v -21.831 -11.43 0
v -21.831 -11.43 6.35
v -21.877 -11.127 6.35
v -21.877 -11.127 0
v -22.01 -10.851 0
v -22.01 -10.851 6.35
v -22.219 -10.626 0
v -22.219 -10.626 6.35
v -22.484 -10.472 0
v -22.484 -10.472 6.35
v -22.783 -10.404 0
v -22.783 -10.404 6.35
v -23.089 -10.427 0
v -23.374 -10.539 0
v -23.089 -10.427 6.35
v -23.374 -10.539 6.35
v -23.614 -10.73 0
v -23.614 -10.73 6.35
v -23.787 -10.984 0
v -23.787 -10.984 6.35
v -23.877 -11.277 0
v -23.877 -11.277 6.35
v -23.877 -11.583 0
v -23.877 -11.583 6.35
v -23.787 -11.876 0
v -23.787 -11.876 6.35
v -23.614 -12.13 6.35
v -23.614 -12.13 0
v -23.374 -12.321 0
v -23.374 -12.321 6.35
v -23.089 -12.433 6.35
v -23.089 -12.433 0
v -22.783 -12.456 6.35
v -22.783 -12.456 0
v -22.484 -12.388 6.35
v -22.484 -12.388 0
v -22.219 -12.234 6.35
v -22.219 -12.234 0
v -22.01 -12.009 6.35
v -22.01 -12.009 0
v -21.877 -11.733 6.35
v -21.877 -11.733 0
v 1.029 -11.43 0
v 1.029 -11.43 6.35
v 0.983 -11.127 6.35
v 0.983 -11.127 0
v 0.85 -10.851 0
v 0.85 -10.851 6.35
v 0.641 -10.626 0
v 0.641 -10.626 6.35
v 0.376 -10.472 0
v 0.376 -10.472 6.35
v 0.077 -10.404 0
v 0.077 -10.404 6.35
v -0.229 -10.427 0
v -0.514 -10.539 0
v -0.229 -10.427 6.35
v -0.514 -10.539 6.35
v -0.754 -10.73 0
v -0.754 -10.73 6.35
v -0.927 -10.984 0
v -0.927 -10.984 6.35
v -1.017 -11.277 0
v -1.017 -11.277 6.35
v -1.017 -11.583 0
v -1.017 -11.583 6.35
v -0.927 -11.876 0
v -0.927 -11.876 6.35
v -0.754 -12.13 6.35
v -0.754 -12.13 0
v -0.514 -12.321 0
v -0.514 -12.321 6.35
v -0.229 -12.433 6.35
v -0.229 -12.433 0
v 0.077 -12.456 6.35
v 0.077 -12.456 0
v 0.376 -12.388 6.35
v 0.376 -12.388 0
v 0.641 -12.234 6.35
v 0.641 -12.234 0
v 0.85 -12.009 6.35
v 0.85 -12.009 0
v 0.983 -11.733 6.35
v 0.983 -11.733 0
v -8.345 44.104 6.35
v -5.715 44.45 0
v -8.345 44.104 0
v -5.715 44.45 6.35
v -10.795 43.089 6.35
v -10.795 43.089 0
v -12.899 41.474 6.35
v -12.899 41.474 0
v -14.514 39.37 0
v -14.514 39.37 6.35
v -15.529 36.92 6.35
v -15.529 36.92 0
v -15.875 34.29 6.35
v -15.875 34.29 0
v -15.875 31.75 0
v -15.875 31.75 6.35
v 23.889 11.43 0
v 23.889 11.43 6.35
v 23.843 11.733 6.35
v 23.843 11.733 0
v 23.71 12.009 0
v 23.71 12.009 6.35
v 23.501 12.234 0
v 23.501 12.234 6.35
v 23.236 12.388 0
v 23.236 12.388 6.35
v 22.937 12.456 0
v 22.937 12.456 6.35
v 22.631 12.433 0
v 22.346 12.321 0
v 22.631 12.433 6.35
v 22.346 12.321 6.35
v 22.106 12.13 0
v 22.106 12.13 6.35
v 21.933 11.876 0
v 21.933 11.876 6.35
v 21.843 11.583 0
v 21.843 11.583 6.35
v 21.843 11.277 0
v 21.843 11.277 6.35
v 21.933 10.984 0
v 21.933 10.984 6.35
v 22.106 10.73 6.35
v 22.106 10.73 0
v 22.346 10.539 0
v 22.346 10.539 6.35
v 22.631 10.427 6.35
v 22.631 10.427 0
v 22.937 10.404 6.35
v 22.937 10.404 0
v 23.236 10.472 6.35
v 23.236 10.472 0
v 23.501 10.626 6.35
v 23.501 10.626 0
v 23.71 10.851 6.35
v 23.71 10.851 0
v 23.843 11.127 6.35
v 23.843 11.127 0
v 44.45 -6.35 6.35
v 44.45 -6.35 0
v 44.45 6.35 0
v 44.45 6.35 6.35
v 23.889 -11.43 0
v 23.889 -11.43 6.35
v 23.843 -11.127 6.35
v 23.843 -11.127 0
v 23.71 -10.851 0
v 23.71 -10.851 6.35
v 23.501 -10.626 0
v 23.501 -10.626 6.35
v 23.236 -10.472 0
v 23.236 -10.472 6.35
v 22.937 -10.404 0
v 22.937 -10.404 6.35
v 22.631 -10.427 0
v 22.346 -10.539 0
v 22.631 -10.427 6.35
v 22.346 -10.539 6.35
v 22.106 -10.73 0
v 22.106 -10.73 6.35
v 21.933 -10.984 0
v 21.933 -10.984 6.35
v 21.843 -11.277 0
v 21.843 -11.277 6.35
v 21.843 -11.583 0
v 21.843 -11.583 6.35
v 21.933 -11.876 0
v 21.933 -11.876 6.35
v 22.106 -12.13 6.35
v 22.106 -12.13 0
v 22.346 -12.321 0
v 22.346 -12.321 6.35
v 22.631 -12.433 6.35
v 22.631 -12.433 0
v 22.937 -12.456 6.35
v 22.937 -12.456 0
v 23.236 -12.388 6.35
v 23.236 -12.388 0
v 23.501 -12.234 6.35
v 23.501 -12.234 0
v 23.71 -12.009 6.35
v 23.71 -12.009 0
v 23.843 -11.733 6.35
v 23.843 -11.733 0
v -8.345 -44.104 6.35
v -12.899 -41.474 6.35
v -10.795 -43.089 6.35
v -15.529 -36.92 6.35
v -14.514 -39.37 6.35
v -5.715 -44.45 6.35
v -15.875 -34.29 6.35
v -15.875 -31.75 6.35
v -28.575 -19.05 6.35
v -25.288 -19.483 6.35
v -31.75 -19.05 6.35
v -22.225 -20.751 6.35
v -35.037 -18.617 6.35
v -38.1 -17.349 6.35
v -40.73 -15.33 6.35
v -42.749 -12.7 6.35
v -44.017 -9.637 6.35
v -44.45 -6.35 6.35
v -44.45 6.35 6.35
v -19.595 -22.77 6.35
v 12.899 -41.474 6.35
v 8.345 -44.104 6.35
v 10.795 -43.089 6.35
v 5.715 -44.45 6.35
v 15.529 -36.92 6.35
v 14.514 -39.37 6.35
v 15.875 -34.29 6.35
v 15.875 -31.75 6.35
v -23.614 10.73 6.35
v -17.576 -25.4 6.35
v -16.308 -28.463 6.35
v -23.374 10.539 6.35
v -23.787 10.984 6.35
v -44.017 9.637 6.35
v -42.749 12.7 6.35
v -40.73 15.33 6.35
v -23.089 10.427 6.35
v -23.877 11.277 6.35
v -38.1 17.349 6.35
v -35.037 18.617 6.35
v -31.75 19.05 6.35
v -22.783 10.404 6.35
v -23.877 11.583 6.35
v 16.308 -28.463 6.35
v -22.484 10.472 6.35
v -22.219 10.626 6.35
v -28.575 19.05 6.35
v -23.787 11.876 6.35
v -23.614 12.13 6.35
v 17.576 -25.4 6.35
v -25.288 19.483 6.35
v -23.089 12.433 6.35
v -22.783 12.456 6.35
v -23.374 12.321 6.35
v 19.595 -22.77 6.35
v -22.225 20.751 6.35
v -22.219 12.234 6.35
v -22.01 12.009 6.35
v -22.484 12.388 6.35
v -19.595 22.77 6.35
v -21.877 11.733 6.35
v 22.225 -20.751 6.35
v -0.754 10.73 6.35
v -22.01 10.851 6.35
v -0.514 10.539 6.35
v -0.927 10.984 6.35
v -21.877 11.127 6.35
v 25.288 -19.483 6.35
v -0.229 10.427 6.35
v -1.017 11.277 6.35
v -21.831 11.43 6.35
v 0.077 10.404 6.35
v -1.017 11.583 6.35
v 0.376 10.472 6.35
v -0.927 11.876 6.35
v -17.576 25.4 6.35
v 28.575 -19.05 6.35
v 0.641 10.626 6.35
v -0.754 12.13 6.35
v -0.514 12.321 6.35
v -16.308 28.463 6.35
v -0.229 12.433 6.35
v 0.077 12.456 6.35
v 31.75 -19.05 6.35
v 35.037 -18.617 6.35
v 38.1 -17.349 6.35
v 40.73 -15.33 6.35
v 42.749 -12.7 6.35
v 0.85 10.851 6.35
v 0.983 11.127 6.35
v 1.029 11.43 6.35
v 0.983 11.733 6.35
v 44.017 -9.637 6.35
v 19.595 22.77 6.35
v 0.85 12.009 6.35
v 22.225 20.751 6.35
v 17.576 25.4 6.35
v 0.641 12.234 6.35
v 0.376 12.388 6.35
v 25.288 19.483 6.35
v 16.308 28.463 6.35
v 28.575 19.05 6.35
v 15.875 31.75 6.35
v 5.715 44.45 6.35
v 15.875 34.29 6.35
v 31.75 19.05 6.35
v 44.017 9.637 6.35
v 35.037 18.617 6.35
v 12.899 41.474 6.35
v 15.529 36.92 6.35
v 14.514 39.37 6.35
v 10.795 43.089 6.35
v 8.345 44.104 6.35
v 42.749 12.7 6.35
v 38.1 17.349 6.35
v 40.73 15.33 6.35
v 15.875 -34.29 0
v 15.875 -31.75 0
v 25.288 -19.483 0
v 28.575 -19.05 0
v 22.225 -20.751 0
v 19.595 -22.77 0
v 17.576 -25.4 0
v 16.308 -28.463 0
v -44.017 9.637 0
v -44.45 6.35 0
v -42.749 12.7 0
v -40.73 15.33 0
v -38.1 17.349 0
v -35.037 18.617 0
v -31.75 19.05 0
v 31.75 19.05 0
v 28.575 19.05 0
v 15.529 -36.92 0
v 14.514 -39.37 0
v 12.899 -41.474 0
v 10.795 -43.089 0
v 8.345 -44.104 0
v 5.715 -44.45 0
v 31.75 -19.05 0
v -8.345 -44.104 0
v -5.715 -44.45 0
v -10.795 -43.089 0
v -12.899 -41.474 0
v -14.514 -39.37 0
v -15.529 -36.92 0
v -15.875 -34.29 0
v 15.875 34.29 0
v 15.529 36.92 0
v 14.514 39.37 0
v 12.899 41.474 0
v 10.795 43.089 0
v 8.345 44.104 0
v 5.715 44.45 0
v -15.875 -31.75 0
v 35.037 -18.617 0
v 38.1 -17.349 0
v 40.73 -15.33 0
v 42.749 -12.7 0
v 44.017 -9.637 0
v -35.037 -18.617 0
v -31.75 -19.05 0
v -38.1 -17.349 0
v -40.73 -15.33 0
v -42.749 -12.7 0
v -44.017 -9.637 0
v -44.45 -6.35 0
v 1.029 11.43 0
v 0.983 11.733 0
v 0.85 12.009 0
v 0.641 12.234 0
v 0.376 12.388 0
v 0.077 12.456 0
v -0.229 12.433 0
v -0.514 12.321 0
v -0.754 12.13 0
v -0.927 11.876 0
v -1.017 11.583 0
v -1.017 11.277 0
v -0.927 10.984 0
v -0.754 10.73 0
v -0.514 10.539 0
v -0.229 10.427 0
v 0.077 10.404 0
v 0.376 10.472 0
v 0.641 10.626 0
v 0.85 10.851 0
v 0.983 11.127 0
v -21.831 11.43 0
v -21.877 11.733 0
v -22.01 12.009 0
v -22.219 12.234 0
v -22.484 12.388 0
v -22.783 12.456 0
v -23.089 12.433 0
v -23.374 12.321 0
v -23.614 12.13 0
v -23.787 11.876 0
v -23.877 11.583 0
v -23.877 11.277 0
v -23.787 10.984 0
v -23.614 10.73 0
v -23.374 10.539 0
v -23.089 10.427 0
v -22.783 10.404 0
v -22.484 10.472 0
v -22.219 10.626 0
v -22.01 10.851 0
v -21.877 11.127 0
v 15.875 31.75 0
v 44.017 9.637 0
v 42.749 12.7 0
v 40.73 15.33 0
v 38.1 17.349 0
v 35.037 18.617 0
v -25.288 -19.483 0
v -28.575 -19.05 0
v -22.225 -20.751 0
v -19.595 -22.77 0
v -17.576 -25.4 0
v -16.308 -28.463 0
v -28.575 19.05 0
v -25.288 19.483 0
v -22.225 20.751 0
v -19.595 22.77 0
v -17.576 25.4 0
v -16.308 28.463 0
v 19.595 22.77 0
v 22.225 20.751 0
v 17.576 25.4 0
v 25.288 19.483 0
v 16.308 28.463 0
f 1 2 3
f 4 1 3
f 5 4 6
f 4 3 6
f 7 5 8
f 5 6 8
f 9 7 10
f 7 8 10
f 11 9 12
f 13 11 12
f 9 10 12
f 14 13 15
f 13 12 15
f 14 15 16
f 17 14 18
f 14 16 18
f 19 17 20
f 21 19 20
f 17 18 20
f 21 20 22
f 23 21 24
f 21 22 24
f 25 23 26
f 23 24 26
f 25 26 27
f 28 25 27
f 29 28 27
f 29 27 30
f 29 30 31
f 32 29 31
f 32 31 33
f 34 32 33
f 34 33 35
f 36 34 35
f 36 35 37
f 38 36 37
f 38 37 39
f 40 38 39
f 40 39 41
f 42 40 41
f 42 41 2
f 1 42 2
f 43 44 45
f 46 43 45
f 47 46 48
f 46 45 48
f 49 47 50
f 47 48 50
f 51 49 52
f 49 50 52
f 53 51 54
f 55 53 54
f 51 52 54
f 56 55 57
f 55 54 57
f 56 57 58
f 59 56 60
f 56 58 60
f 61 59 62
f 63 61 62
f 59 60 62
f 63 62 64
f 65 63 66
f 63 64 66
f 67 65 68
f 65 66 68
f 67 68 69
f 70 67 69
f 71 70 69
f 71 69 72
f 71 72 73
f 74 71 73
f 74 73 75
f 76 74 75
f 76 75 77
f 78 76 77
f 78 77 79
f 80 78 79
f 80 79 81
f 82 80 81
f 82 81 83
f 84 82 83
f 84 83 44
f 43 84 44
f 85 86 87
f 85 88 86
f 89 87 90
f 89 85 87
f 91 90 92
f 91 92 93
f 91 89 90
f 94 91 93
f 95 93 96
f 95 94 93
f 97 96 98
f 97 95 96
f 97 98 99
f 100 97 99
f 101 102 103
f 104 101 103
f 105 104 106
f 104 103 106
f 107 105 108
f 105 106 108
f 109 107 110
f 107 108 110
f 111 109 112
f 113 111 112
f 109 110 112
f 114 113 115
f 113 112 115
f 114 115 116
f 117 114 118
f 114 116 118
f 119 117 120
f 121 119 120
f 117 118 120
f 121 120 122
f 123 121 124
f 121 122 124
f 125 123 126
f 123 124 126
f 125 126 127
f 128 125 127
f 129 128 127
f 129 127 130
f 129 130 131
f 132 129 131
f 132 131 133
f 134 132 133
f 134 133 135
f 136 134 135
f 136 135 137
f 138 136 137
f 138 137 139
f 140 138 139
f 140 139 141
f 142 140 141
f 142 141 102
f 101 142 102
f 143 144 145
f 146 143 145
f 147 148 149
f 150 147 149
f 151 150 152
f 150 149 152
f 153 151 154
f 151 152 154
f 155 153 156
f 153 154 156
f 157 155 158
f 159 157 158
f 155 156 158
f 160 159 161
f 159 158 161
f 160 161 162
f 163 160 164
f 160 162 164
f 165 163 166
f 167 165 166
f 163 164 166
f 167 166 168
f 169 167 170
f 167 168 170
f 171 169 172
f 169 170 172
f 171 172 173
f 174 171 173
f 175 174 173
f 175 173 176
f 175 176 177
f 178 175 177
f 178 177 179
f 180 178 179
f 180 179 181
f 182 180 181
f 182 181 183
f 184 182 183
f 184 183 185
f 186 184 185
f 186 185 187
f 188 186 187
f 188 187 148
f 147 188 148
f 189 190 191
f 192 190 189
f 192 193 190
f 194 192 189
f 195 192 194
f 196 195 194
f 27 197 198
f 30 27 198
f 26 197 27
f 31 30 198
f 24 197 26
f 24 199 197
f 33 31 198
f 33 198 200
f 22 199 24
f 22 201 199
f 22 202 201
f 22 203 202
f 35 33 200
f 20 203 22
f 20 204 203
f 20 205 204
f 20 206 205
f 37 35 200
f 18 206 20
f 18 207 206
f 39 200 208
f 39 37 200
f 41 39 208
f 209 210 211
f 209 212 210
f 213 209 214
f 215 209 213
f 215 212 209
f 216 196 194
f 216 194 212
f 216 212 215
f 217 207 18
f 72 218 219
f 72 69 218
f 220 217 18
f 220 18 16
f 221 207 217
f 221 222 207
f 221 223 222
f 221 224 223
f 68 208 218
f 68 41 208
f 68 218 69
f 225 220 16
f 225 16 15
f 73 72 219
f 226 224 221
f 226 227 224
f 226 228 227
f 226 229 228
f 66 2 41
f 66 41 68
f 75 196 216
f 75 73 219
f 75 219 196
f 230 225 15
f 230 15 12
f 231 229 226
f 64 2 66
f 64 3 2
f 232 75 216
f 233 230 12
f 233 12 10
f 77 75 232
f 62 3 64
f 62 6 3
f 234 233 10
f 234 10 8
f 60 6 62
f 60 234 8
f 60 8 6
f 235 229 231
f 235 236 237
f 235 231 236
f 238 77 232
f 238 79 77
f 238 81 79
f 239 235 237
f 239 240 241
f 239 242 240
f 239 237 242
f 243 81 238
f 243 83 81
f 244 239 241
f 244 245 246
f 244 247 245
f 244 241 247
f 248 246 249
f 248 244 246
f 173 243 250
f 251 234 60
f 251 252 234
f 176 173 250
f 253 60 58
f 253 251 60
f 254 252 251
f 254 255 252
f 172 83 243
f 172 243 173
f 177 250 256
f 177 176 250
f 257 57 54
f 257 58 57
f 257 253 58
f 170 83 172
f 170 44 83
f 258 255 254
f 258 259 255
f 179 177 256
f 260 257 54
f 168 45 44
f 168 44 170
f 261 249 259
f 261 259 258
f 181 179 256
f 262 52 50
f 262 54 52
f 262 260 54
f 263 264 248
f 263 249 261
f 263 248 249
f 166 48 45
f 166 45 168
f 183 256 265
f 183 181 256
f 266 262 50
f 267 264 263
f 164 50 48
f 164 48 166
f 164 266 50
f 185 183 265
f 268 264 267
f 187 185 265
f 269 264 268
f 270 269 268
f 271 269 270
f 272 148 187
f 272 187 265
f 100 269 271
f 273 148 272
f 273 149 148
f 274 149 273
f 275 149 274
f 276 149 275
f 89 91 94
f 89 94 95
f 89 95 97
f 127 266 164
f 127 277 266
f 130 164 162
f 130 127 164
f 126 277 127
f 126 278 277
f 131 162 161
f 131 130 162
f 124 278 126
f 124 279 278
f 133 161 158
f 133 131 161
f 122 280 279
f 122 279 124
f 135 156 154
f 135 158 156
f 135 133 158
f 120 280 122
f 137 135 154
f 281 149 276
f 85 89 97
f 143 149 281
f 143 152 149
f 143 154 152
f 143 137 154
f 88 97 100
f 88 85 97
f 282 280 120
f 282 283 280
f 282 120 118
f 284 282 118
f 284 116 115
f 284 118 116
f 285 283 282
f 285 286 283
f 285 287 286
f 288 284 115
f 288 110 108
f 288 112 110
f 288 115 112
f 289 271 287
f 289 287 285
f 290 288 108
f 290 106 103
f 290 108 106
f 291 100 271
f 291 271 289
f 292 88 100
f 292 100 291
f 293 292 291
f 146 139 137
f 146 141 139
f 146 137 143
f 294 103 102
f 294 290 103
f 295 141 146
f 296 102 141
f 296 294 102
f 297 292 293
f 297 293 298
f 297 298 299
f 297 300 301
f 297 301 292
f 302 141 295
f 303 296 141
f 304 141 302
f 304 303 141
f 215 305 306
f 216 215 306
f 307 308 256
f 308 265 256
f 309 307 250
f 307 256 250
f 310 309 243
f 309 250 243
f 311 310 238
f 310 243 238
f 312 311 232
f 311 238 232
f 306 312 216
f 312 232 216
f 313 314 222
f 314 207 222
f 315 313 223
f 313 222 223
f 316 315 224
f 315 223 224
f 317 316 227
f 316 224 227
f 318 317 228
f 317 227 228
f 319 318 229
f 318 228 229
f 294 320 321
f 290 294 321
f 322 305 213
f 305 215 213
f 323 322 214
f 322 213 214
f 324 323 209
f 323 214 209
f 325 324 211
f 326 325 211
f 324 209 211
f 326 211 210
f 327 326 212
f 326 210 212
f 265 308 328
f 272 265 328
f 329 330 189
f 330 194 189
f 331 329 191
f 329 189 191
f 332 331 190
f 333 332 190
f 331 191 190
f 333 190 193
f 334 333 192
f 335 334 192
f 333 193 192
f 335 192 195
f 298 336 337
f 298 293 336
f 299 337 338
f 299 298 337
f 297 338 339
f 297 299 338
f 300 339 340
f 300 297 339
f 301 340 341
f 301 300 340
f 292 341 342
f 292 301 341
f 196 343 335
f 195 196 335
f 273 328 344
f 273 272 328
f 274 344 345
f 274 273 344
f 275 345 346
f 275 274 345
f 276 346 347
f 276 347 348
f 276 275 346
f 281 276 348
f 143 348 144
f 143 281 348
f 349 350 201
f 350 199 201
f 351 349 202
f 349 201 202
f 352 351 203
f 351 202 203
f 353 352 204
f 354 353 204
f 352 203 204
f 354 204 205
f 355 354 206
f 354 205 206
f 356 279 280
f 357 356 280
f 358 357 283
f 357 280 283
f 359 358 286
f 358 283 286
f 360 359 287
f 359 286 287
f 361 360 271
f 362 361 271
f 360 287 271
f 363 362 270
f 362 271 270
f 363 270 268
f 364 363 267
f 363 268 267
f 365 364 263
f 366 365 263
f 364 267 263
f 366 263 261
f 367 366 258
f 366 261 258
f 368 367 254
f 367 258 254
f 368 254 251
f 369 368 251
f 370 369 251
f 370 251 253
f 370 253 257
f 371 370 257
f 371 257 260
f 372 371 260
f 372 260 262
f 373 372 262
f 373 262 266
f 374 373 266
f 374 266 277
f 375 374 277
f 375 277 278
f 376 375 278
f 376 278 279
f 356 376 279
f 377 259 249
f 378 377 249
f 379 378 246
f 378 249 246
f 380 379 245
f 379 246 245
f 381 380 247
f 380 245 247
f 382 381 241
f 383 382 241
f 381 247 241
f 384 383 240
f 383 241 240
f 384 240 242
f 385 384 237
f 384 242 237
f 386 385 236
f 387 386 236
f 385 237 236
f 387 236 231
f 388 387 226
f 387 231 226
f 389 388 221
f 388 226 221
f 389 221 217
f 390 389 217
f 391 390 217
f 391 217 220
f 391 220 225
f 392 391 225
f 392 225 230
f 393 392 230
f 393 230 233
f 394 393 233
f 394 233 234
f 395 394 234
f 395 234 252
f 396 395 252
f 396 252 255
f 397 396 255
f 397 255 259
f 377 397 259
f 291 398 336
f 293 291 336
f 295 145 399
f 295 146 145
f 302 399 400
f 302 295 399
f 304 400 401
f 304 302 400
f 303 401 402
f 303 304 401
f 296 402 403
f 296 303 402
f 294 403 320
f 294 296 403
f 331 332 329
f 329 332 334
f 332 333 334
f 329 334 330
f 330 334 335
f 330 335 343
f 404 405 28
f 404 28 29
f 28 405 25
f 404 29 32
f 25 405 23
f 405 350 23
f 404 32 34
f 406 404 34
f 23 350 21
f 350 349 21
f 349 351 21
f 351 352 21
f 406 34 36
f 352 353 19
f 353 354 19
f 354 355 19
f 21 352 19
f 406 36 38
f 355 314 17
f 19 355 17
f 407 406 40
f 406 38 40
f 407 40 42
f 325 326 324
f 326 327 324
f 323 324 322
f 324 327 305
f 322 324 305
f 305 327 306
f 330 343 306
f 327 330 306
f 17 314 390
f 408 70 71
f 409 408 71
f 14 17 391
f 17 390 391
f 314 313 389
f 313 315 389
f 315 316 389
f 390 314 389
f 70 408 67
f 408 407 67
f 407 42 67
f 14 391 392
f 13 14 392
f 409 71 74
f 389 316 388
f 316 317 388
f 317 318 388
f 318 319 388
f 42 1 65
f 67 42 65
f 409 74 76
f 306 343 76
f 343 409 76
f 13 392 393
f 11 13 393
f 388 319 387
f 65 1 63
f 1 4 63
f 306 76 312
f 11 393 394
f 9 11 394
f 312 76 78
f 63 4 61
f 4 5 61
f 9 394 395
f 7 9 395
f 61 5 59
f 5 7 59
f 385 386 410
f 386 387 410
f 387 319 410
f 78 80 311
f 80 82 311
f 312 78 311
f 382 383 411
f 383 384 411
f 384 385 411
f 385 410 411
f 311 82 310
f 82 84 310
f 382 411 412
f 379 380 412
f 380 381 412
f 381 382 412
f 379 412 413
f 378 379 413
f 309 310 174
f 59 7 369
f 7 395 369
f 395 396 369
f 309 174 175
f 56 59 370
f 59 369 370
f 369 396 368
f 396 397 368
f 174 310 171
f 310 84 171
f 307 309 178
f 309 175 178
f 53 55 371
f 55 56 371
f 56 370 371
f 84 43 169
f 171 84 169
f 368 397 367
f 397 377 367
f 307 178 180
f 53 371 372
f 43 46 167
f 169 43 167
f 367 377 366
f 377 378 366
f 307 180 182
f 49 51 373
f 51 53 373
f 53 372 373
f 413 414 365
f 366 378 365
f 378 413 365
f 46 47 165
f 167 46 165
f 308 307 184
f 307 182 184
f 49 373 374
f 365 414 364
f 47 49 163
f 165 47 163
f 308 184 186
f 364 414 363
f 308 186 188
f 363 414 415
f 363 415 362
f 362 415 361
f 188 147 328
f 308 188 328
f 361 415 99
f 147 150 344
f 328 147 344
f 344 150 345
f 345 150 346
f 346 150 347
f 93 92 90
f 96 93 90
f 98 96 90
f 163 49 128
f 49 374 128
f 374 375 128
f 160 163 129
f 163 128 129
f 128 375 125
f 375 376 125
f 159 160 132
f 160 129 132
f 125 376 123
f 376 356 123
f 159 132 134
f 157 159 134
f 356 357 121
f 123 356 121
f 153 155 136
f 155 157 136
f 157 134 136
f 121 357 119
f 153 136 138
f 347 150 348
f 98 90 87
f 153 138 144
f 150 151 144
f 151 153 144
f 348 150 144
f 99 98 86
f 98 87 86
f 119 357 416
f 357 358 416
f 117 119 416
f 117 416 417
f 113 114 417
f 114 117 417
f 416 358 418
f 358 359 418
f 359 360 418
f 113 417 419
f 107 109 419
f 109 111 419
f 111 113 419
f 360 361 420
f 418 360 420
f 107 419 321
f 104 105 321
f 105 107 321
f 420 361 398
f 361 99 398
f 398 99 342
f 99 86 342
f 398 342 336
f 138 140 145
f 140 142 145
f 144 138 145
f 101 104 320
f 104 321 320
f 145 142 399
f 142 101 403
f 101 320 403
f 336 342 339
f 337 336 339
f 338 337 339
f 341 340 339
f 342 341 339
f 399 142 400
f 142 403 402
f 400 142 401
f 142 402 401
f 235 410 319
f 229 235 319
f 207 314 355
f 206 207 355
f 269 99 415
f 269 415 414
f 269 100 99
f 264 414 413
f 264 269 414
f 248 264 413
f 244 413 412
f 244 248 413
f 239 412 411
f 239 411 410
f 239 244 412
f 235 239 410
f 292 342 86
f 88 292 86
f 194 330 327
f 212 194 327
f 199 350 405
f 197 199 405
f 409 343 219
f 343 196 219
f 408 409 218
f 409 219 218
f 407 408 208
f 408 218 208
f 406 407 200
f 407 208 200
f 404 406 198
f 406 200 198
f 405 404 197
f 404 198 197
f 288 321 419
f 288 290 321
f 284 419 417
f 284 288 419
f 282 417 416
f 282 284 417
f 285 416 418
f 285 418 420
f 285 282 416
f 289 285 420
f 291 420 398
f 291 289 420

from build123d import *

# Parameters (mm, degrees)
F1_DEPTH = 6.35
F2_R     = 1.0287
F3_DEPTH = 25.4
F4_R     = 12.7
F5_R     = 10.16


with BuildPart() as f1:
    # F0 (on Top) → F1 (new body)
    with BuildSketch(Plane.XY):
        Polygon((15.875, -19.05), (44.45, -19.05), (44.45, 19.05), (15.875, 19.05), (15.875, 44.45), (-15.875, 44.45), (-15.875, 19.05), (-44.45, 19.05), (-44.45, -19.05), (-15.875, -19.05), (-15.875, -44.45), (15.875, -44.45), align=None)
    extrude(amount=F1_DEPTH)

    # F2 (on face) → F3 (cut)
    with BuildSketch(Plane.XY.offset(6.35)):
        with Locations((-22.86, 11.43)):
            Circle(F2_R)
        with Locations((-22.86, -11.43)):
            Circle(F2_R)
        with Locations((0, 11.43)):
            Circle(F2_R)
        with Locations((0, -11.43)):
            Circle(F2_R)
        with Locations((22.86, 11.43)):
            Circle(F2_R)
        with Locations((22.86, -11.43)):
            Circle(F2_R)
    extrude(amount=-F3_DEPTH, mode=Mode.SUBTRACT)

    # F4
    f4_edges = [f1.edges().sort_by_distance(p)[0] for p in [
        (-44.45, -19.05, 3.175),
        (-44.45, 19.05, 3.175),
        (44.45, 19.05, 3.175),
        (44.45, -19.05, 3.175),
        (-15.875, -19.05, 3.175),
        (-15.875, 19.05, 3.175),
        (15.875, 19.05, 3.175),
        (15.875, -19.05, 3.175),
    ]]
    fillet(f4_edges, radius=F4_R)

    # F5
    f5_edges = [f1.edges().sort_by_distance(p)[0] for p in [
        (-15.875, 44.45, 3.175),
        (15.875, 44.45, 3.175),
        (-15.875, -44.45, 3.175),
        (15.875, -44.45, 3.175),
    ]]
    fillet(f5_edges, radius=F5_R)


solid = f1.part
